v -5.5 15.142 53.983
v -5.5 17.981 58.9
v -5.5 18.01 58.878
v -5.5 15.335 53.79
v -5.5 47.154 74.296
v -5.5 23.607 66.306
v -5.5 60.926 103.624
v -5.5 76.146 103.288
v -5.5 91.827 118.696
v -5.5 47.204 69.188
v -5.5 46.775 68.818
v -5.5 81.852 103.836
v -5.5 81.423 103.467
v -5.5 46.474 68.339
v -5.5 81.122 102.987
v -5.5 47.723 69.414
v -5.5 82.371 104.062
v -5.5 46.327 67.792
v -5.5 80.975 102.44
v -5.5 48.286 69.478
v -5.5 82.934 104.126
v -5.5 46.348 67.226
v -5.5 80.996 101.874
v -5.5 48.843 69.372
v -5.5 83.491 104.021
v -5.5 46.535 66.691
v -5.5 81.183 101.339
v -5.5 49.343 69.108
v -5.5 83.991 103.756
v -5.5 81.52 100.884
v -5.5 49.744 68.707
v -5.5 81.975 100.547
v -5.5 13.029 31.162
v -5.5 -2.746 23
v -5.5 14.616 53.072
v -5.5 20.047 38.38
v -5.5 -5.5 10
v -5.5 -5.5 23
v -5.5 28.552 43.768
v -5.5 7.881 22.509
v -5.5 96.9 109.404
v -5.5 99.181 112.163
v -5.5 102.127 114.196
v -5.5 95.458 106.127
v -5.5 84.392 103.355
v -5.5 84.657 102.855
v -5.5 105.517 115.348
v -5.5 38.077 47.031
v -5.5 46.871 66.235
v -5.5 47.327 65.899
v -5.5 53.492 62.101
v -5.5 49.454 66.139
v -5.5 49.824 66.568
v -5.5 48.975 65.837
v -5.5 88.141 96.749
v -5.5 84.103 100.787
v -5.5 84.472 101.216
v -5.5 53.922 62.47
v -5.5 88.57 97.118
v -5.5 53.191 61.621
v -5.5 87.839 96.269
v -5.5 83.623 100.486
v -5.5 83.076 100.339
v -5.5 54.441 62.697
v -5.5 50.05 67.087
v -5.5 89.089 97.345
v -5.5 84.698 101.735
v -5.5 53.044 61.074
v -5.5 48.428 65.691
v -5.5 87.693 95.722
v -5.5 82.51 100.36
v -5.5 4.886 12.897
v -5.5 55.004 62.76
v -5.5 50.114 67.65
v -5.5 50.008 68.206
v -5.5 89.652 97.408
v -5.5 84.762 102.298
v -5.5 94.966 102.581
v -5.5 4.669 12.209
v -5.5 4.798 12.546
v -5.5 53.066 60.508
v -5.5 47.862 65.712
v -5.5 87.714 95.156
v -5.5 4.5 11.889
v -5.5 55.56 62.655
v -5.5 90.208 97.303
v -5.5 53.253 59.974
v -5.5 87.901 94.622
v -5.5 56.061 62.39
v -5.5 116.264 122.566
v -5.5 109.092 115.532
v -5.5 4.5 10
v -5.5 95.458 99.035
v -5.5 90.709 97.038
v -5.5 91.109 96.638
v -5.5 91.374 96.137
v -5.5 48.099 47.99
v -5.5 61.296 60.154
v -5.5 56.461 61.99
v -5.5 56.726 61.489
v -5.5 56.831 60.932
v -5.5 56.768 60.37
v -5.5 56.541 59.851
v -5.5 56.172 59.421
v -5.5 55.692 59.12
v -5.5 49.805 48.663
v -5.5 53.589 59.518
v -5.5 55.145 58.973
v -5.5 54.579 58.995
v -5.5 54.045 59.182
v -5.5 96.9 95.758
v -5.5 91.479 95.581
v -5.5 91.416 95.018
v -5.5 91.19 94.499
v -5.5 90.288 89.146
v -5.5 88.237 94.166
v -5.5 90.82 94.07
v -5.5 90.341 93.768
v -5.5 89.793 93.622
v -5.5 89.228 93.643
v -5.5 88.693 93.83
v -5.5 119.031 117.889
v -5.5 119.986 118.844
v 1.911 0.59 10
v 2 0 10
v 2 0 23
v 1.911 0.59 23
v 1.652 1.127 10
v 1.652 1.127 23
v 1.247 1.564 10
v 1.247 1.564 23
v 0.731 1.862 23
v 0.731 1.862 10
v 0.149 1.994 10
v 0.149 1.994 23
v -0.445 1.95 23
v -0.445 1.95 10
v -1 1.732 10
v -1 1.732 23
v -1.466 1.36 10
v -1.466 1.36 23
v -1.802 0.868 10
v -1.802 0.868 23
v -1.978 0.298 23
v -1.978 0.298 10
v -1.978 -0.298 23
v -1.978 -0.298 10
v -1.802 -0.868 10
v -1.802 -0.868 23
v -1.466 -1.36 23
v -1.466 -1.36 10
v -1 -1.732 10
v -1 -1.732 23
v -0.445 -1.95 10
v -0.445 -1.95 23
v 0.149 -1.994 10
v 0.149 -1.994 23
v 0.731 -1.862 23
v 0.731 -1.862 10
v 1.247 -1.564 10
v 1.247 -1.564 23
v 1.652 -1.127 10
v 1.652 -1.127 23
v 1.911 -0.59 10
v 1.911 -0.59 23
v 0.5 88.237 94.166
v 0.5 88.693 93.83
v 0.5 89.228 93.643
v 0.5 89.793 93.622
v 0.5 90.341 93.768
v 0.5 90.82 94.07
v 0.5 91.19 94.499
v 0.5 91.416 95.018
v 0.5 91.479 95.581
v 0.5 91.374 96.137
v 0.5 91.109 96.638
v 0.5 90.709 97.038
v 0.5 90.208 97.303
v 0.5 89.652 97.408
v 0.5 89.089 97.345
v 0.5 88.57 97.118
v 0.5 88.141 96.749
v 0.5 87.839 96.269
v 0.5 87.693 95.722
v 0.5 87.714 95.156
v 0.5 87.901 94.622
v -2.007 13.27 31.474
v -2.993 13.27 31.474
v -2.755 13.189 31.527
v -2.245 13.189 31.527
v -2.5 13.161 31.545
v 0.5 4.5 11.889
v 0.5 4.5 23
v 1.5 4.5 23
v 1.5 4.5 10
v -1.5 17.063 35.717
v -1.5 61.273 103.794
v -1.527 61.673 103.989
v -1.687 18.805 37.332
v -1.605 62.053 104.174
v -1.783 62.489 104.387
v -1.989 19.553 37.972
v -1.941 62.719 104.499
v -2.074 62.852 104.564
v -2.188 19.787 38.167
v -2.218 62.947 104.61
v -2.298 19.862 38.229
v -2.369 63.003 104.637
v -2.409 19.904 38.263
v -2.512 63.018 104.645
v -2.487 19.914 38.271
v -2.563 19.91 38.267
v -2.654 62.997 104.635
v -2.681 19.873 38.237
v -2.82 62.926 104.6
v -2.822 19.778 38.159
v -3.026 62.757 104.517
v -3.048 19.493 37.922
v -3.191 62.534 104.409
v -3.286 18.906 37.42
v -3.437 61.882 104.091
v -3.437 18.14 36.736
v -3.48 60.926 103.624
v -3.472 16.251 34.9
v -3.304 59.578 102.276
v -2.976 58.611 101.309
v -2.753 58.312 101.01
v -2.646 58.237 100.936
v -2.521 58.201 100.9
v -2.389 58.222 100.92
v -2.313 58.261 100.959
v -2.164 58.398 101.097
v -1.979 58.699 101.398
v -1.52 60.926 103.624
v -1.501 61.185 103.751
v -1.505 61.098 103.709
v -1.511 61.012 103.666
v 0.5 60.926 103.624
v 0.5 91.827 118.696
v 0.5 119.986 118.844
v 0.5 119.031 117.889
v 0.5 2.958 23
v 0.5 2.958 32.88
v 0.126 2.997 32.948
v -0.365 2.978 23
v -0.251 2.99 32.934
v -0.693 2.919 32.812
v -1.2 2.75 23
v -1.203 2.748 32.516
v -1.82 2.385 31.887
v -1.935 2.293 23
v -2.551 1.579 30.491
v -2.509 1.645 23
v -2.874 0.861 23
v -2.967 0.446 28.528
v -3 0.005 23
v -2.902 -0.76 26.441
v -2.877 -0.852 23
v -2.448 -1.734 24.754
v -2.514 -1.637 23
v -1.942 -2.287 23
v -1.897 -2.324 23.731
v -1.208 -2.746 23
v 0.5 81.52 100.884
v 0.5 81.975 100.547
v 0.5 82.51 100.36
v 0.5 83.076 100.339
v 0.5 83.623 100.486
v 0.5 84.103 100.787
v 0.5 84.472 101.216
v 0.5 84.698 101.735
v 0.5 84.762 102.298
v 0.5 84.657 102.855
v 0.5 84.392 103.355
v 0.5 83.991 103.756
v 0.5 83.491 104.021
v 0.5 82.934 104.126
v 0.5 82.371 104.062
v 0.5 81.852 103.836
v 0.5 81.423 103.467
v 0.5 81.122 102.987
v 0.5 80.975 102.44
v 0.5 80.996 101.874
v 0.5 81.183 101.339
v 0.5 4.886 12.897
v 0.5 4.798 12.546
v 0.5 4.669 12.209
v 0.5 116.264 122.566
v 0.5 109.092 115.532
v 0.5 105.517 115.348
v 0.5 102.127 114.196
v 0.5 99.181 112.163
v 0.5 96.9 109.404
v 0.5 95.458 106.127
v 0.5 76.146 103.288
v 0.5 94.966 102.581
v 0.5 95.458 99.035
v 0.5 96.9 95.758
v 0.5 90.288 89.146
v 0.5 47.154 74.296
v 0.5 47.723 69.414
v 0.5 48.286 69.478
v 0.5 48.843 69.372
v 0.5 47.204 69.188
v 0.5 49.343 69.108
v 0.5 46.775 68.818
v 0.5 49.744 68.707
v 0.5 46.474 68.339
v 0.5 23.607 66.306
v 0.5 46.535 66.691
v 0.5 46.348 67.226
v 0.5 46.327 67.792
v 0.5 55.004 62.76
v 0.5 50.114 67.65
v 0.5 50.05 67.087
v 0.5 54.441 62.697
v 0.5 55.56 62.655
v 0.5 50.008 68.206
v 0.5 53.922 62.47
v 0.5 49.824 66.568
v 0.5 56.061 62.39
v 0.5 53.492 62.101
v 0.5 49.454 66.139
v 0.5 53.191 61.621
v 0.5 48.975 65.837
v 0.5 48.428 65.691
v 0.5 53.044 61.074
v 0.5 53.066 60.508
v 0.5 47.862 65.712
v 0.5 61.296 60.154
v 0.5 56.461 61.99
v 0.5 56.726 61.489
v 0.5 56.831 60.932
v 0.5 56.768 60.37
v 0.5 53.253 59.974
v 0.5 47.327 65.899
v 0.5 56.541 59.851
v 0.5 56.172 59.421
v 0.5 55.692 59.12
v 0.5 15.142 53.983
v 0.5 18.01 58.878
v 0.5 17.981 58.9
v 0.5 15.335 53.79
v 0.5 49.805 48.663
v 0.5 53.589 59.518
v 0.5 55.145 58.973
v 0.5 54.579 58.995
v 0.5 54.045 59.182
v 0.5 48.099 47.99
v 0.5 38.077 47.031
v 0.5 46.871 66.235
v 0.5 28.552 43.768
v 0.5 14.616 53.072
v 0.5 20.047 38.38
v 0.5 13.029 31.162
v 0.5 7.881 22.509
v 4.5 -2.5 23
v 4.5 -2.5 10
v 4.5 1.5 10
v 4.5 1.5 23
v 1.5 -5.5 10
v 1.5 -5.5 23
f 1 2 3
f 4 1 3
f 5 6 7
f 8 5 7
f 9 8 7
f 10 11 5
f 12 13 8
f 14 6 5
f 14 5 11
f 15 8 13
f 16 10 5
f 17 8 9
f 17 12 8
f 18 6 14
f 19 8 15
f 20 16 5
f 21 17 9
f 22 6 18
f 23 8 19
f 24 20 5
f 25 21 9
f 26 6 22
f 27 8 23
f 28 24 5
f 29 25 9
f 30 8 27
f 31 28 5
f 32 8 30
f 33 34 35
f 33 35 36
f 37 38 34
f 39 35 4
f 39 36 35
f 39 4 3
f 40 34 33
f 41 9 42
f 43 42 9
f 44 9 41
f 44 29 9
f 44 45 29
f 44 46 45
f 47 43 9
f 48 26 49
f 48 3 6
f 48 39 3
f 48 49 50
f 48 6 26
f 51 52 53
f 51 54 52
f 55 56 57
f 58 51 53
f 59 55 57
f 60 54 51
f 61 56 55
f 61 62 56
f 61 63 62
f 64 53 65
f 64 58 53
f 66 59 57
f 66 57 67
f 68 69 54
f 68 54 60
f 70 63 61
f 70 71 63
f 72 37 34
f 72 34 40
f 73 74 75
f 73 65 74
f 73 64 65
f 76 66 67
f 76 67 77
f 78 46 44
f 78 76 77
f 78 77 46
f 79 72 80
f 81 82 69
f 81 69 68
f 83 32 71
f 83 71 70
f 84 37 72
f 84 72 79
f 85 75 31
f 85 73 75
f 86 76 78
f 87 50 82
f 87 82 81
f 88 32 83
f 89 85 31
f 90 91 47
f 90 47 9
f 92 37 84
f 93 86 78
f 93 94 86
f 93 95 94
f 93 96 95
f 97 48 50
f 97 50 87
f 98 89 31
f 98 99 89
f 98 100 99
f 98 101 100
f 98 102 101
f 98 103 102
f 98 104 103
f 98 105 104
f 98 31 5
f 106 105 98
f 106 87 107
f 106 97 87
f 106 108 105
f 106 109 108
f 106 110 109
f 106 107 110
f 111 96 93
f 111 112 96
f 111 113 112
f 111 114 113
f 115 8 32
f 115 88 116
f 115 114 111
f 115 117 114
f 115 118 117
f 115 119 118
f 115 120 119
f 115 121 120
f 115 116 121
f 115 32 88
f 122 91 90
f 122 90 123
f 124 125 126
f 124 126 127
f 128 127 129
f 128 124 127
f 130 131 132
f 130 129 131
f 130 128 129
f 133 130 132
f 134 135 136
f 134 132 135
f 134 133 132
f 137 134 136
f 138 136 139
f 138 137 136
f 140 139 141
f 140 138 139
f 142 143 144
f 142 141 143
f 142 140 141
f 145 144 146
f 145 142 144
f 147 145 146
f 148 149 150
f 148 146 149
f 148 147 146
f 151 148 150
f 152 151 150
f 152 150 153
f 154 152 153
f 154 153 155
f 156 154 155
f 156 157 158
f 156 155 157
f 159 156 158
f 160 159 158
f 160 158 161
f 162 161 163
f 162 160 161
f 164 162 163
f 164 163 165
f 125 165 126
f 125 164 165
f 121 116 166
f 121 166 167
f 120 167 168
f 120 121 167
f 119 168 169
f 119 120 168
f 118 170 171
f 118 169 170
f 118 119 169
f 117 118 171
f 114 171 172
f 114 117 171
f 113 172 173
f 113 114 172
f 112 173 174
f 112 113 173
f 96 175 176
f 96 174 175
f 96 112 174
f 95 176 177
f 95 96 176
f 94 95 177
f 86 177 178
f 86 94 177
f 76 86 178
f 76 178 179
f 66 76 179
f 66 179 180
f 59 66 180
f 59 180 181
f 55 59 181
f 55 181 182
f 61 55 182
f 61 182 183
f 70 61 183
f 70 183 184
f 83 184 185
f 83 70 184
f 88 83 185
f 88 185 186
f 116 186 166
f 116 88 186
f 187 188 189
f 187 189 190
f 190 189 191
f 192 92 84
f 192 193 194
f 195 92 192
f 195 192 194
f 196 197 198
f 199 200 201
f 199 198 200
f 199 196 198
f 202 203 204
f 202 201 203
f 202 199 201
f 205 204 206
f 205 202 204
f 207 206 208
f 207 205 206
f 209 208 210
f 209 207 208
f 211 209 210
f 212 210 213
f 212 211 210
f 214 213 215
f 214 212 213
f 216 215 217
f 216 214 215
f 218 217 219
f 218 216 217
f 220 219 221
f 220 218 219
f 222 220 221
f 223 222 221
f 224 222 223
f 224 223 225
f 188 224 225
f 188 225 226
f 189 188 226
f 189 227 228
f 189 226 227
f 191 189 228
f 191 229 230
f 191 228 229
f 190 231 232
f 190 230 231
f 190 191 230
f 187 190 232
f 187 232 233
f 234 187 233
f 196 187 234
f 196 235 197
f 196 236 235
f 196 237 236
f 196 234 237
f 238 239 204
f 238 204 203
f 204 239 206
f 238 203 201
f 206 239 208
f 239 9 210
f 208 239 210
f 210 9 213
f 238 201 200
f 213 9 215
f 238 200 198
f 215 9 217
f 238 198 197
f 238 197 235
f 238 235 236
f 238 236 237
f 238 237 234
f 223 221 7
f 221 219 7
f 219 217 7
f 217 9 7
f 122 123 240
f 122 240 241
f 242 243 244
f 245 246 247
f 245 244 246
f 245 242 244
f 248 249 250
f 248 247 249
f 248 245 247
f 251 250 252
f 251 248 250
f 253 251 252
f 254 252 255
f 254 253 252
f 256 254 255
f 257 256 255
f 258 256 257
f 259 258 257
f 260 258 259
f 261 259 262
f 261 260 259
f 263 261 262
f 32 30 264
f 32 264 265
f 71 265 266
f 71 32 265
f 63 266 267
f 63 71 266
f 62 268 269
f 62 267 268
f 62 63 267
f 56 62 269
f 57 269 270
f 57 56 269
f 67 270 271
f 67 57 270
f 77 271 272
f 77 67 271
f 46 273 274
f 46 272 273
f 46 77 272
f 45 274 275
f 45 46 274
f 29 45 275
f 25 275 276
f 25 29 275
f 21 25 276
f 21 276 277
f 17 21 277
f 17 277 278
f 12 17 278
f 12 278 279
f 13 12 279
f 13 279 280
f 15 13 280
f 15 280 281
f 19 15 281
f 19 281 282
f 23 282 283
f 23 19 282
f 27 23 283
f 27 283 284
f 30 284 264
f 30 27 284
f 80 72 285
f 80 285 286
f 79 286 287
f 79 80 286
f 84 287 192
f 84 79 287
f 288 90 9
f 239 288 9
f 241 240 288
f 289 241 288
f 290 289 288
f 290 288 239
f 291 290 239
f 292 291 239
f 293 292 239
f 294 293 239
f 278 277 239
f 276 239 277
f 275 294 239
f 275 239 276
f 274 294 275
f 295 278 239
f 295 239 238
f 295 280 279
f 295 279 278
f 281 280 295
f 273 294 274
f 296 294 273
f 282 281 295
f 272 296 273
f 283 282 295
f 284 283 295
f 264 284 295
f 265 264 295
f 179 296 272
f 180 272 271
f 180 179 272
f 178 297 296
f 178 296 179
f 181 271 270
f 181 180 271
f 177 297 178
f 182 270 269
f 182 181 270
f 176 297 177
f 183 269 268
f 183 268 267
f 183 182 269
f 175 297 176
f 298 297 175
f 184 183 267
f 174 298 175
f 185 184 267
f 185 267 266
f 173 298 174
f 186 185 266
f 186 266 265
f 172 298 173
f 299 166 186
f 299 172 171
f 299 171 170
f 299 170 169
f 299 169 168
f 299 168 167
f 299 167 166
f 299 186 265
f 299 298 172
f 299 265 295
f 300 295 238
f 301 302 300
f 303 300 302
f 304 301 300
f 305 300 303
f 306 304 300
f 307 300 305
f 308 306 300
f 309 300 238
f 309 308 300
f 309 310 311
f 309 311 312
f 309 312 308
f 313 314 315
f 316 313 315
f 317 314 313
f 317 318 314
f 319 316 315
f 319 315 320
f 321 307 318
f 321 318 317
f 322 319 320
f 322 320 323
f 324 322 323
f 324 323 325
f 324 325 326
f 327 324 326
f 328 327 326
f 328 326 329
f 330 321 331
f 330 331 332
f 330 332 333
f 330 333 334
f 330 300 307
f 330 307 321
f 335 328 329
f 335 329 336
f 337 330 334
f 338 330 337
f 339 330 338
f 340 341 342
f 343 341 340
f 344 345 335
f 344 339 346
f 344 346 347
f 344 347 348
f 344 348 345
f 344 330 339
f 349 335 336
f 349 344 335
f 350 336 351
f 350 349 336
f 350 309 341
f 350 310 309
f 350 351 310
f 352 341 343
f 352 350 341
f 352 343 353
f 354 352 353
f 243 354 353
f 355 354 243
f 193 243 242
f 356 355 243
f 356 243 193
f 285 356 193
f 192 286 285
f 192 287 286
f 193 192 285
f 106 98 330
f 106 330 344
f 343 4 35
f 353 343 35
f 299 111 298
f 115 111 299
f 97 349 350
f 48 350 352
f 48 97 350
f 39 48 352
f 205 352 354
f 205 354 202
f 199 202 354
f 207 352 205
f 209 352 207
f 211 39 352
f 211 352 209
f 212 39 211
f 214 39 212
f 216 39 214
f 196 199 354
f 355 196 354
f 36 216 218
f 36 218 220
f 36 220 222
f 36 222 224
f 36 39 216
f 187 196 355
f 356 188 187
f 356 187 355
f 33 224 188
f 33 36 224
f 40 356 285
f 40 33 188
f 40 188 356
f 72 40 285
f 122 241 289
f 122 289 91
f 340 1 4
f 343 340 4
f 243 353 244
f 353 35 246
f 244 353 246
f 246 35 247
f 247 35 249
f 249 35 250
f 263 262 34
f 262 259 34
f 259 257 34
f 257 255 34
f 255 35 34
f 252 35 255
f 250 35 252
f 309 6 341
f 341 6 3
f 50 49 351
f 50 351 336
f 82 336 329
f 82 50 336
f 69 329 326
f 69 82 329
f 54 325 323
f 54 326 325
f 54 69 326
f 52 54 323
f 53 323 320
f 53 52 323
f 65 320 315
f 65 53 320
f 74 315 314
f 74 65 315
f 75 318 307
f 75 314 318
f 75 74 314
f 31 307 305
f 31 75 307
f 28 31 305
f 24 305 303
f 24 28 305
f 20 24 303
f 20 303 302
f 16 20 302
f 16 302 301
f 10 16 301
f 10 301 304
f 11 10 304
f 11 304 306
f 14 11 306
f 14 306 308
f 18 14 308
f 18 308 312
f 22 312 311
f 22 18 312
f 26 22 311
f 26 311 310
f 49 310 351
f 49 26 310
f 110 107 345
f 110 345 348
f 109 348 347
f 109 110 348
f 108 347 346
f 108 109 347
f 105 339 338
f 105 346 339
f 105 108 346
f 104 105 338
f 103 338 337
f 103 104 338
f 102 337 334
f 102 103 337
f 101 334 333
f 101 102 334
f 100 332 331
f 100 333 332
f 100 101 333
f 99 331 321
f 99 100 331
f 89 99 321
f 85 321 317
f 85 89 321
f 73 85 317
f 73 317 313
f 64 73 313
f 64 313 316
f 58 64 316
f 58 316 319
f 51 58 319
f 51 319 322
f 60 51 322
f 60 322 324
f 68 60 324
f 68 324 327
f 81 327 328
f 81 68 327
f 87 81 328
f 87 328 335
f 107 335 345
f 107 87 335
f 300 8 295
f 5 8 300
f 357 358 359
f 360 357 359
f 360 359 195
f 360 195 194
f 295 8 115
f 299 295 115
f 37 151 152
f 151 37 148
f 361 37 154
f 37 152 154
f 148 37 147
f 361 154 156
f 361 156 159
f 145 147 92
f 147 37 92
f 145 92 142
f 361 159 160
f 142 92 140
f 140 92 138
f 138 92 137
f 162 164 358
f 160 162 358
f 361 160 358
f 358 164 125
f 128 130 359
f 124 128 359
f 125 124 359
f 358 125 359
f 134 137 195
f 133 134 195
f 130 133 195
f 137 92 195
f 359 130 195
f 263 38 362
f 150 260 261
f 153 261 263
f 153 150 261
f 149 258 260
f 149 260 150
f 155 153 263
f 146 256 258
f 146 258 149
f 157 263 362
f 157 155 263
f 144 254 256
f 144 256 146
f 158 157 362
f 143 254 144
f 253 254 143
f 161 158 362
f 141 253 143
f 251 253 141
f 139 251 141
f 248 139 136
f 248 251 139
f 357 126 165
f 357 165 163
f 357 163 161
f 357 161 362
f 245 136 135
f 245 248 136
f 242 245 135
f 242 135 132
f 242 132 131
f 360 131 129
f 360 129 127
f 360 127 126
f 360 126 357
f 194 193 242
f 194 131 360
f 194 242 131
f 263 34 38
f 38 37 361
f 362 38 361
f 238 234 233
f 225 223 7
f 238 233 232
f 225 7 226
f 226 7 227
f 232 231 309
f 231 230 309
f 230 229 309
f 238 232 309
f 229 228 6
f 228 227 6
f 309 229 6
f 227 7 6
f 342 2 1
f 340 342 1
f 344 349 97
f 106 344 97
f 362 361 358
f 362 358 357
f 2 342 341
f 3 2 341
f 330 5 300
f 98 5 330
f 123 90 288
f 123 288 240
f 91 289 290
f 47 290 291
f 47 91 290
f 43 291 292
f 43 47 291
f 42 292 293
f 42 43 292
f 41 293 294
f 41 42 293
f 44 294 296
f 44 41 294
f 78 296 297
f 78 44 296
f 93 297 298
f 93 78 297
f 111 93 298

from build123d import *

# Parameters (mm, degrees)
CYLINDER025_R          = 1
CYLINDER025_DEPTH      = 96
CYLINDER025_ROLL_ANGLE = -33
CYLINDER020_R          = 2
CYLINDER020_DEPTH      = 16
CYLINDER024_R          = 3
CYLINDER024_DEPTH      = 16
CYLINDER022_R          = 3
CYLINDER022_DEPTH      = 16
BOX021_W               = 26
BOX021_H               = 23
BOX021_DEPTH           = 13
CYLINDER011_R          = 1.9
CYLINDER011_DEPTH      = 12
CYLINDER012_R          = 1.9
CYLINDER012_DEPTH      = 12
CYLINDER013_R          = 1.9
CYLINDER013_DEPTH      = 12
CYLINDER014_R          = 1.9
CYLINDER014_DEPTH      = 12
BOX008_W               = 41
BOX008_H               = 20
BOX008_DEPTH           = 12
BOX019_W               = 10
BOX019_H               = 10
BOX019_DEPTH           = 10
BOX019_PLACEMENT_ANGLE = 8
BOX018_W               = 14
BOX018_H               = 10
BOX018_DEPTH           = 10
BOX018_PLACEMENT_ANGLE = 16
BOX017_W               = 65
BOX017_H               = 11
BOX017_DEPTH           = 10
BOX017_PLACEMENT_ANGLE = 15
BOX016_W               = 76
BOX016_H               = 10
BOX016_DEPTH           = 10
BOX015_W               = 49
BOX015_H               = 10
BOX015_DEPTH           = 10
BOX015_PLACEMENT_ANGLE = -19
BOX014_W               = 53
BOX014_H               = 10
BOX014_DEPTH           = 10
BOX014_PLACEMENT_ANGLE = -36
BOX013_W               = 13
BOX013_H               = 11
BOX013_DEPTH           = 10
BOX012_W               = 23
BOX012_H               = 17
BOX012_DEPTH           = 10
BOX011_W               = 41
BOX011_H               = 6
BOX011_DEPTH           = 10
CYLINDER016_R          = 43
CYLINDER016_DEPTH      = 10
CYLINDER015_R          = 13
CYLINDER015_DEPTH      = 10
BOX010_W               = 37
BOX010_H               = 8
BOX010_DEPTH           = 12
BOX009_W               = 184
BOX009_H               = 34
BOX009_DEPTH           = 6
CHAMFER_SIZE           = 6
CHAMFER001_SIZE        = 1
CUT025_PITCH_ANGLE     = 90
FILLET_R               = 3
FILLET001_R            = 3
CUT035_ROLL_ANGLE      = -45
BOX024_W               = 10
BOX024_H               = 10
BOX024_DEPTH           = 13
CHAMFER002_SIZE        = 3
CHAMFER003_SIZE        = 3


with BuildPart() as cylinder025:
    # Cylinder025 → Cylinder025 (new body)
    with BuildSketch(Plane.XY):
        Circle(CYLINDER025_R)
    extrude(amount=CYLINDER025_DEPTH)


with BuildPart() as cylinder025_1:
    # Cylinder025 roll: moved
    add(cylinder025.part.rotate(Axis((0, 0, 0), (1, 0, 0)), CYLINDER025_ROLL_ANGLE))


with BuildPart() as cylinder025_2:
    # Cylinder025 placement: moved
    add(cylinder025_1.part.moved(Location((-2.5, 14, 31))))


with BuildPart() as cylinder020:
    # Cylinder020 → Cylinder020 (new body)
    with BuildSketch(Plane.XY.offset(9)):
        Circle(CYLINDER020_R)
    extrude(amount=CYLINDER020_DEPTH)


with BuildPart() as cylinder024:
    # Cylinder024 → Cylinder024 (new body)
    with BuildSketch(Plane.XY.offset(23)):
        Circle(CYLINDER024_R)
    extrude(amount=CYLINDER024_DEPTH)


with BuildPart() as not_used_cylinder001:
    # Cylinder022 → Cylinder022 (new body)
    with BuildSketch(Plane(origin=(0, -50, 23), x_dir=(1, 0, 0), z_dir=(0, 0, 1))):
        Circle(CYLINDER022_R)
    extrude(amount=CYLINDER022_DEPTH)


with BuildPart() as cube021:
    # Box021 → Box021 (new body)
    with BuildSketch(Plane(origin=(161, 15, -3), x_dir=(1, 0, 0), z_dir=(0, 0, 1))):
        with Locations((13, 11.5)):
            Rectangle(BOX021_W, BOX021_H)
    extrude(amount=BOX021_DEPTH)


with BuildPart() as cylinder011:
    # Cylinder011 → Cylinder011 (new body)
    with BuildSketch(Plane(origin=(38, 19.5, -1), x_dir=(1, 0, 0), z_dir=(0, 0, 1))):
        Circle(CYLINDER011_R)
    extrude(amount=CYLINDER011_DEPTH)


with BuildPart() as cylinder012:
    # Cylinder012 → Cylinder012 (new body)
    with BuildSketch(Plane(origin=(38, 29, -1), x_dir=(1, 0, 0), z_dir=(0, 0, 1))):
        Circle(CYLINDER012_R)
    extrude(amount=CYLINDER012_DEPTH)


with BuildPart() as cylinder013:
    # Cylinder013 → Cylinder013 (new body)
    with BuildSketch(Plane(origin=(87, 29, -1), x_dir=(1, 0, 0), z_dir=(0, 0, 1))):
        Circle(CYLINDER013_R)
    extrude(amount=CYLINDER013_DEPTH)


with BuildPart() as cylinder014:
    # Cylinder014 → Cylinder014 (new body)
    with BuildSketch(Plane(origin=(87, 19.5, -1), x_dir=(1, 0, 0), z_dir=(0, 0, 1))):
        Circle(CYLINDER014_R)
    extrude(amount=CYLINDER014_DEPTH)


with BuildPart() as cube008:
    # Box008 → Box008 (new body)
    with BuildSketch(Plane(origin=(42, 14, -1), x_dir=(1, 0, 0), z_dir=(0, 0, 1))):
        with Locations((20.5, 10)):
            Rectangle(BOX008_W, BOX008_H)
    extrude(amount=BOX008_DEPTH)


with BuildPart() as cube019:
    # Box019 → Box019 (new body)
    with BuildSketch(Plane.XY):
        with Locations((5, 5)):
            Rectangle(BOX019_W, BOX019_H)
    extrude(amount=BOX019_DEPTH)


with BuildPart() as cube019_1:
    # Box019 placement: moved
    add(cube019.part.moved(Location((106, -7, 0))).rotate(Axis((106, -7, 0), (0, 0, 1)), BOX019_PLACEMENT_ANGLE))


with BuildPart() as cube018:
    # Box018 → Box018 (new body)
    with BuildSketch(Plane.XY):
        with Locations((7, 5)):
            Rectangle(BOX018_W, BOX018_H)
    extrude(amount=BOX018_DEPTH)


with BuildPart() as cube018_1:
    # Box018 placement: moved
    add(cube018.part.moved(Location((174, 10, 0))).rotate(Axis((174, 10, 0), (0, 0, 1)), BOX018_PLACEMENT_ANGLE))


with BuildPart() as cube017:
    # Box017 → Box017 (new body)
    with BuildSketch(Plane.XY):
        with Locations((32.5, 5.5)):
            Rectangle(BOX017_W, BOX017_H)
    extrude(amount=BOX017_DEPTH)


with BuildPart() as cube017_1:
    # Box017 placement: moved
    add(cube017.part.moved(Location((115, -7, 0))).rotate(Axis((115, -7, 0), (0, 0, 1)), BOX017_PLACEMENT_ANGLE))


with BuildPart() as cube016:
    # Box016 → Box016 (new body)
    with BuildSketch(Plane(origin=(46, -7, 0), x_dir=(1, 0, 0), z_dir=(0, 0, 1))):
        with Locations((38, 5)):
            Rectangle(BOX016_W, BOX016_H)
    extrude(amount=BOX016_DEPTH)


with BuildPart() as cube015:
    # Box015 → Box015 (new body)
    with BuildSketch(Plane.XY):
        with Locations((24.5, 5)):
            Rectangle(BOX015_W, BOX015_H)
    extrude(amount=BOX015_DEPTH)


with BuildPart() as cube015_1:
    # Box015 placement: moved
    add(cube015.part.moved(Location((16, 5, 0))).rotate(Axis((16, 5, 0), (0, 0, 1)), BOX015_PLACEMENT_ANGLE))


with BuildPart() as cube014:
    # Box014 → Box014 (new body)
    with BuildSketch(Plane.XY):
        with Locations((26.5, 5)):
            Rectangle(BOX014_W, BOX014_H)
    extrude(amount=BOX014_DEPTH)


with BuildPart() as cube014_1:
    # Box014 placement: moved
    add(cube014.part.moved(Location((-16, 28, 0))).rotate(Axis((-16, 28, 0), (0, 0, 1)), BOX014_PLACEMENT_ANGLE))


with BuildPart() as cube013:
    # Box013 → Box013 (new body)
    with BuildSketch(Plane(origin=(0, 8, 0), x_dir=(1, 0, 0), z_dir=(0, 0, 1))):
        with Locations((6.5, 5.5)):
            Rectangle(BOX013_W, BOX013_H)
    extrude(amount=BOX013_DEPTH)


with BuildPart() as cube012:
    # Box012 → Box012 (new body)
    with BuildSketch(Plane(origin=(161, 0, 0), x_dir=(1, 0, 0), z_dir=(0, 0, 1))):
        with Locations((11.5, 8.5)):
            Rectangle(BOX012_W, BOX012_H)
    extrude(amount=BOX012_DEPTH)


with BuildPart() as cube011:
    # Box011 → Box011 (new body)
    with BuildSketch(Plane(origin=(120, 0, 0), x_dir=(1, 0, 0), z_dir=(0, 0, 1))):
        with Locations((20.5, 3)):
            Rectangle(BOX011_W, BOX011_H)
    extrude(amount=BOX011_DEPTH)


with BuildPart() as cylinder016:
    # Cylinder016 → Cylinder016 (new body)
    with BuildSketch(Plane(origin=(132, 63, 0), x_dir=(1, 0, 0), z_dir=(0, 0, 1))):
        Circle(CYLINDER016_R)
    extrude(amount=CYLINDER016_DEPTH)


with BuildPart() as cylinder015:
    # Cylinder015 → Cylinder015 (new body)
    with BuildSketch(Plane(origin=(20, 37, 0), x_dir=(1, 0, 0), z_dir=(0, 0, 1))):
        Circle(CYLINDER015_R)
    extrude(amount=CYLINDER015_DEPTH)


with BuildPart() as cube010:
    # Box010 → Box010 (new body)
    with BuildSketch(Plane.XY):
        with Locations((18.5, 4)):
            Rectangle(BOX010_W, BOX010_H)
    extrude(amount=BOX010_DEPTH)


with BuildPart() as cut035:
    # Box009 → Box009 (new body)
    with BuildSketch(Plane.XY):
        with Locations((92, 17)):
            Rectangle(BOX009_W, BOX009_H)
    extrude(amount=BOX009_DEPTH)

    # Cut008: cut Cube010
    add(cube010.part, mode=Mode.SUBTRACT)

    # Cut009: cut Cylinder015
    add(cylinder015.part, mode=Mode.SUBTRACT)

    # Cut010: cut Cylinder016
    add(cylinder016.part, mode=Mode.SUBTRACT)

    # Cut011: cut Cube011
    add(cube011.part, mode=Mode.SUBTRACT)

    # Cut012: cut Cube012
    add(cube012.part, mode=Mode.SUBTRACT)

    # Cut013: cut Cube013
    add(cube013.part, mode=Mode.SUBTRACT)

    # Cut014: cut Cube014
    add(cube014_1.part, mode=Mode.SUBTRACT)

    # Cut015: cut Cube015
    add(cube015_1.part, mode=Mode.SUBTRACT)

    # Cut016: cut Cube016
    add(cube016.part, mode=Mode.SUBTRACT)

    # Cut017: cut Cube017
    add(cube017_1.part, mode=Mode.SUBTRACT)

    # Cut018: cut Cube018
    add(cube018_1.part, mode=Mode.SUBTRACT)

    # Cut019: cut Cube019
    add(cube019_1.part, mode=Mode.SUBTRACT)

    # Cut020: cut Cube008
    add(cube008.part, mode=Mode.SUBTRACT)

    # Cut021: cut Cylinder014
    add(cylinder014.part, mode=Mode.SUBTRACT)

    # Cut022: cut Cylinder013
    add(cylinder013.part, mode=Mode.SUBTRACT)

    # Cut023: cut Cylinder012
    add(cylinder012.part, mode=Mode.SUBTRACT)

    # Cut024: cut Cylinder011
    add(cylinder011.part, mode=Mode.SUBTRACT)

    # Chamfer
    chamfer_edges = [cut035.edges().sort_by_distance(p)[0] for p in [
        (7.350889, 34, 3),
    ]]
    chamfer(chamfer_edges, length=CHAMFER_SIZE)

    # Chamfer001
    chamfer001_edges = [cut035.edges().sort_by_distance(p)[0] for p in [
        (100.250984, 34, 3),
    ]]
    chamfer(chamfer001_edges, length=CHAMFER001_SIZE)

    # Cut025: cut Cube021
    add(cube021.part, mode=Mode.SUBTRACT)


with BuildPart() as cut035_1:
    # Cut025 pitch: moved
    add(cut035.part.rotate(Axis((0, 0, 0), (0, 1, 0)), CUT025_PITCH_ANGLE))


with BuildPart() as cut035_2:
    # Cut025 placement: moved
    add(cut035_1.part.moved(Location((-5.5, -24, 171))))

    # Fillet
    fillet_edges = [cut035_2.edges().sort_by_distance(p)[0] for p in [
        (-2.5, 7.250984, 10),
    ]]
    fillet(fillet_edges, radius=FILLET_R)

    # Fillet001
    fillet001_edges = [cut035_2.edges().sort_by_distance(p)[0] for p in [
        (-2.5, -7.286299, 10),
    ]]
    fillet(fillet001_edges, radius=FILLET001_R)

    # Cut035: cut Not used cylinder001
    add(not_used_cylinder001.part, mode=Mode.SUBTRACT)


with BuildPart() as cut035_3:
    # Cut035 roll: moved
    add(cut035_2.part.rotate(Axis((0, 0, 0), (1, 0, 0)), CUT035_ROLL_ANGLE))


with BuildPart() as cut035_4:
    # Cut035 placement: moved
    add(cut035_3.part.moved(Location((0, -8, 5))))


with BuildPart() as leg:
    # Box024 → Box024 (new body)
    with BuildSketch(Plane(origin=(-5.5, -5.5, 10), x_dir=(1, 0, 0), z_dir=(0, 0, 1))):
        with Locations((5, 5)):
            Rectangle(BOX024_W, BOX024_H)
    extrude(amount=BOX024_DEPTH)

    # Fusion006: union Cut035
    add(cut035_4.part)

    # Cut036: cut Cylinder024
    add(cylinder024.part, mode=Mode.SUBTRACT)

    # Cut037: cut Cylinder020
    add(cylinder020.part, mode=Mode.SUBTRACT)

    # Chamfer002
    chamfer002_edges = [leg.edges().sort_by_distance(p)[0] for p in [
        (4.5, 4.5, 16.5),
    ]]
    chamfer(chamfer002_edges, length=CHAMFER002_SIZE)

    # Chamfer003
    chamfer003_edges = [leg.edges().sort_by_distance(p)[0] for p in [
        (4.5, -5.5, 16.5),
    ]]
    chamfer(chamfer003_edges, length=CHAMFER003_SIZE)

    # Cut038: cut Cylinder025
    add(cylinder025_2.part, mode=Mode.SUBTRACT)


solid = leg.part
